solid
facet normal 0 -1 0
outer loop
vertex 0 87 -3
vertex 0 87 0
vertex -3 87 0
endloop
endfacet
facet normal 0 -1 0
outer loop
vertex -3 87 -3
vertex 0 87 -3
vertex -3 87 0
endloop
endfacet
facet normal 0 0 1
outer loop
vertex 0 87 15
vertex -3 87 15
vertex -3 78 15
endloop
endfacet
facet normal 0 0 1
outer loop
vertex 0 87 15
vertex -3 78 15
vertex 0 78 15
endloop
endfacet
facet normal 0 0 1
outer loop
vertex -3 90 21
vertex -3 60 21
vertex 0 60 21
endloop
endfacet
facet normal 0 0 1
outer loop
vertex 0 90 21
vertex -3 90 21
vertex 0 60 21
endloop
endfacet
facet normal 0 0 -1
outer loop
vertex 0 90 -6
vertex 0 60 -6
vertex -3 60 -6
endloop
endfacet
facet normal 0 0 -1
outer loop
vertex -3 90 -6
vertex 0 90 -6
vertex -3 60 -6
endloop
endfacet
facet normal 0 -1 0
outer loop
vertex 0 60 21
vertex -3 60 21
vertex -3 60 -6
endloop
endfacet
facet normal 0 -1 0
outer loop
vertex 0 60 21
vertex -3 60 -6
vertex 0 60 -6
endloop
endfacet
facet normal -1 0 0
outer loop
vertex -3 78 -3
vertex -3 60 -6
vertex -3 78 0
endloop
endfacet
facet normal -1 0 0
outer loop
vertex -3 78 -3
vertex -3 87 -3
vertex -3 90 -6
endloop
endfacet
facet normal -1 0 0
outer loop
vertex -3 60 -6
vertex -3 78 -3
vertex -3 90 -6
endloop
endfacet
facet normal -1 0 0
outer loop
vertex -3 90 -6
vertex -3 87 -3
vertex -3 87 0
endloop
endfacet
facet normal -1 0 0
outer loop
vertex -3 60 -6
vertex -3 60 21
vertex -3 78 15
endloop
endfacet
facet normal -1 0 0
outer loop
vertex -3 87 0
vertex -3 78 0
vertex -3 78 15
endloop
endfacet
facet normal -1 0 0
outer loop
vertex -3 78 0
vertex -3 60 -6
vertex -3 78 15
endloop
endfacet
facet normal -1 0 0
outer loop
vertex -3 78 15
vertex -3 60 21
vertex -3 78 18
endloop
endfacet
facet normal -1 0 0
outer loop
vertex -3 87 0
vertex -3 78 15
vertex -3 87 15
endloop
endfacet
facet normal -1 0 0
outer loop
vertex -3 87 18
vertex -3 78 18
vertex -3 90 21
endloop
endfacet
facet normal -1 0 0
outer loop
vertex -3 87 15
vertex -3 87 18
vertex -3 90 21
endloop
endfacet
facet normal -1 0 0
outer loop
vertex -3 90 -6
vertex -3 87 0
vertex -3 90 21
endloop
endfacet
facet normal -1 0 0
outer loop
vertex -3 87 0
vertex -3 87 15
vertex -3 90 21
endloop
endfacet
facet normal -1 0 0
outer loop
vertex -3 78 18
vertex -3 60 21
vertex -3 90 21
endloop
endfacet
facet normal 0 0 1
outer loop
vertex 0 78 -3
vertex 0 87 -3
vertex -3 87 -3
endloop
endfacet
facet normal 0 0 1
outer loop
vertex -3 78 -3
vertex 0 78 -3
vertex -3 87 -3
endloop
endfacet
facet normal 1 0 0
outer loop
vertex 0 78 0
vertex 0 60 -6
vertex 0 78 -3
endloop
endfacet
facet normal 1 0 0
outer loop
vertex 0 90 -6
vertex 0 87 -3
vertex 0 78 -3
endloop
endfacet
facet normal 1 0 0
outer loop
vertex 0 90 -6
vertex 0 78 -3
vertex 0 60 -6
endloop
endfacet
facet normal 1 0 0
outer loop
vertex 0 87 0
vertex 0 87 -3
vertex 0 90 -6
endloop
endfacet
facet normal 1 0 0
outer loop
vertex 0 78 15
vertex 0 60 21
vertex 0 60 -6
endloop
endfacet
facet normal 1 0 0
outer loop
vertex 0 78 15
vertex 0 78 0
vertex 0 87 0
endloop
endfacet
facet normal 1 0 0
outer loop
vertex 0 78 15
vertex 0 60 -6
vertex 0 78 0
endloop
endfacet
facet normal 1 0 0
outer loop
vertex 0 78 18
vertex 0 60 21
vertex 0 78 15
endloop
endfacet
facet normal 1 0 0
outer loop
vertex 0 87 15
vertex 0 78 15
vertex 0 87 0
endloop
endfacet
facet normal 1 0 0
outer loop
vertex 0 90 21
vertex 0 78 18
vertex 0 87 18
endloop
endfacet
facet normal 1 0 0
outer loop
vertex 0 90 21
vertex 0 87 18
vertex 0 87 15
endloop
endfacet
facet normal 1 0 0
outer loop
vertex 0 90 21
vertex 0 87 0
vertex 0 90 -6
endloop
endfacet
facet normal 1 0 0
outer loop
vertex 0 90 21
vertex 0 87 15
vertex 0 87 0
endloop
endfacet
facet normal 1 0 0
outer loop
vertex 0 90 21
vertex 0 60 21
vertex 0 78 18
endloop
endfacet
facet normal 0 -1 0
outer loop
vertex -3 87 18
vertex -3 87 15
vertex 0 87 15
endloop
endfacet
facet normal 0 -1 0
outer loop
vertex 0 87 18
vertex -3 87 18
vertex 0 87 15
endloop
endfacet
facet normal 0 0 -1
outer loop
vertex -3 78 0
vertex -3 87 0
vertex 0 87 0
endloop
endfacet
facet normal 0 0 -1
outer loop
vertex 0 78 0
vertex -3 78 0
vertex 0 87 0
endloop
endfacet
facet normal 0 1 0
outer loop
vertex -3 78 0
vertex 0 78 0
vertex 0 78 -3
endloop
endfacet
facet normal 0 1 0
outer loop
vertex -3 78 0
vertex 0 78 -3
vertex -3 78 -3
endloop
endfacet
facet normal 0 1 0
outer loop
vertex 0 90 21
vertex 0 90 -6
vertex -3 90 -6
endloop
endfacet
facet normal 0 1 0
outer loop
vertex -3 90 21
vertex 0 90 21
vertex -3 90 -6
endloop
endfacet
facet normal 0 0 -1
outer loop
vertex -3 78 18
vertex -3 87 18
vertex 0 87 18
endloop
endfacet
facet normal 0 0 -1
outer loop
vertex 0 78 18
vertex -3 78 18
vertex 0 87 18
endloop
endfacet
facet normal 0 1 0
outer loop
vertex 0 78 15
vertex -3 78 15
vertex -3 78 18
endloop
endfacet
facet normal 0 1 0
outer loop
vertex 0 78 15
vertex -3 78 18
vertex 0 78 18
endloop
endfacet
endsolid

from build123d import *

# Parameters (mm, degrees)
BOX078_W               = 3
BOX078_H               = 15
BOX078_DEPTH           = 6
BOX042_W               = 3
BOX042_H               = 9
BOX042_DEPTH           = 3
BOX041_W               = 3
BOX041_H               = 15
BOX041_DEPTH           = 6
BOX044_W               = 3
BOX044_H               = 9
BOX044_DEPTH           = 3
BOX043_W               = 3
BOX043_H               = 15
BOX043_DEPTH           = 6
CUT014_PLACEMENT_ANGLE = 180
BOX040_W               = 3
BOX040_H               = 30
BOX040_DEPTH           = 15
BOX079_W               = 3
BOX079_H               = 15
BOX079_DEPTH           = 6


with BuildPart() as cube002:
    # Box078 → Box078 (new body)
    with BuildSketch(Plane(origin=(-3, 60, 15), x_dir=(1, 0, 0), z_dir=(0, 0, 1))):
        with Locations((1.5, 7.5)):
            Rectangle(BOX078_W, BOX078_H)
    extrude(amount=BOX078_DEPTH)


with BuildPart() as w_rfel042:
    # Box042 → Box042 (new body)
    with BuildSketch(Plane(origin=(0, 3, 0), x_dir=(1, 0, 0), z_dir=(0, 0, 1))):
        with Locations((1.5, 4.5)):
            Rectangle(BOX042_W, BOX042_H)
    extrude(amount=BOX042_DEPTH)


with BuildPart() as loop004:
    # Box041 → Box041 (new body)
    with BuildSketch(Plane.XY):
        with Locations((1.5, 7.5)):
            Rectangle(BOX041_W, BOX041_H)
    extrude(amount=BOX041_DEPTH)

    # Cut013: cut Würfel042
    add(w_rfel042.part, mode=Mode.SUBTRACT)


with BuildPart() as loop004_1:
    # Cut013 placement: moved
    add(loop004.part.moved(Location((30, 75, 15))))


with BuildPart() as w_rfel044:
    # Box044 → Box044 (new body)
    with BuildSketch(Plane(origin=(0, 3, 0), x_dir=(1, 0, 0), z_dir=(0, 0, 1))):
        with Locations((1.5, 4.5)):
            Rectangle(BOX044_W, BOX044_H)
    extrude(amount=BOX044_DEPTH)


with BuildPart() as loop005:
    # Box043 → Box043 (new body)
    with BuildSketch(Plane.XY):
        with Locations((1.5, 7.5)):
            Rectangle(BOX043_W, BOX043_H)
    extrude(amount=BOX043_DEPTH)

    # Cut014: cut Würfel044
    add(w_rfel044.part, mode=Mode.SUBTRACT)


with BuildPart() as loop005_1:
    # Cut014 placement: moved
    add(loop005.part.moved(Location((33, 75, 0))).rotate(Axis((33, 75, 0), (0, 1, 0)), CUT014_PLACEMENT_ANGLE))


with BuildPart() as sideplate002:
    # Box040 → Box040 (new body)
    with BuildSketch(Plane(origin=(30, 60, 0), x_dir=(1, 0, 0), z_dir=(0, 0, 1))):
        with Locations((1.5, 15)):
            Rectangle(BOX040_W, BOX040_H)
    extrude(amount=BOX040_DEPTH)

    # Fusion010: union Loop004, Loop005
    add(loop004_1.part)
    add(loop005_1.part)


with BuildPart() as sideplate002_1:
    # Fusion010 placement: moved
    add(sideplate002.part.moved(Location((-33, 0, 0))))


with BuildPart() as fusion023:
    # Box079 → Box079 (new body)
    with BuildSketch(Plane(origin=(-3, 60, -6), x_dir=(1, 0, 0), z_dir=(0, 0, 1))):
        with Locations((1.5, 7.5)):
            Rectangle(BOX079_W, BOX079_H)
    extrude(amount=BOX079_DEPTH)

    # Fusion023: union Cube002, SidePlate002
    add(cube002.part)
    add(sideplate002_1.part)


solid = fusion023.part
